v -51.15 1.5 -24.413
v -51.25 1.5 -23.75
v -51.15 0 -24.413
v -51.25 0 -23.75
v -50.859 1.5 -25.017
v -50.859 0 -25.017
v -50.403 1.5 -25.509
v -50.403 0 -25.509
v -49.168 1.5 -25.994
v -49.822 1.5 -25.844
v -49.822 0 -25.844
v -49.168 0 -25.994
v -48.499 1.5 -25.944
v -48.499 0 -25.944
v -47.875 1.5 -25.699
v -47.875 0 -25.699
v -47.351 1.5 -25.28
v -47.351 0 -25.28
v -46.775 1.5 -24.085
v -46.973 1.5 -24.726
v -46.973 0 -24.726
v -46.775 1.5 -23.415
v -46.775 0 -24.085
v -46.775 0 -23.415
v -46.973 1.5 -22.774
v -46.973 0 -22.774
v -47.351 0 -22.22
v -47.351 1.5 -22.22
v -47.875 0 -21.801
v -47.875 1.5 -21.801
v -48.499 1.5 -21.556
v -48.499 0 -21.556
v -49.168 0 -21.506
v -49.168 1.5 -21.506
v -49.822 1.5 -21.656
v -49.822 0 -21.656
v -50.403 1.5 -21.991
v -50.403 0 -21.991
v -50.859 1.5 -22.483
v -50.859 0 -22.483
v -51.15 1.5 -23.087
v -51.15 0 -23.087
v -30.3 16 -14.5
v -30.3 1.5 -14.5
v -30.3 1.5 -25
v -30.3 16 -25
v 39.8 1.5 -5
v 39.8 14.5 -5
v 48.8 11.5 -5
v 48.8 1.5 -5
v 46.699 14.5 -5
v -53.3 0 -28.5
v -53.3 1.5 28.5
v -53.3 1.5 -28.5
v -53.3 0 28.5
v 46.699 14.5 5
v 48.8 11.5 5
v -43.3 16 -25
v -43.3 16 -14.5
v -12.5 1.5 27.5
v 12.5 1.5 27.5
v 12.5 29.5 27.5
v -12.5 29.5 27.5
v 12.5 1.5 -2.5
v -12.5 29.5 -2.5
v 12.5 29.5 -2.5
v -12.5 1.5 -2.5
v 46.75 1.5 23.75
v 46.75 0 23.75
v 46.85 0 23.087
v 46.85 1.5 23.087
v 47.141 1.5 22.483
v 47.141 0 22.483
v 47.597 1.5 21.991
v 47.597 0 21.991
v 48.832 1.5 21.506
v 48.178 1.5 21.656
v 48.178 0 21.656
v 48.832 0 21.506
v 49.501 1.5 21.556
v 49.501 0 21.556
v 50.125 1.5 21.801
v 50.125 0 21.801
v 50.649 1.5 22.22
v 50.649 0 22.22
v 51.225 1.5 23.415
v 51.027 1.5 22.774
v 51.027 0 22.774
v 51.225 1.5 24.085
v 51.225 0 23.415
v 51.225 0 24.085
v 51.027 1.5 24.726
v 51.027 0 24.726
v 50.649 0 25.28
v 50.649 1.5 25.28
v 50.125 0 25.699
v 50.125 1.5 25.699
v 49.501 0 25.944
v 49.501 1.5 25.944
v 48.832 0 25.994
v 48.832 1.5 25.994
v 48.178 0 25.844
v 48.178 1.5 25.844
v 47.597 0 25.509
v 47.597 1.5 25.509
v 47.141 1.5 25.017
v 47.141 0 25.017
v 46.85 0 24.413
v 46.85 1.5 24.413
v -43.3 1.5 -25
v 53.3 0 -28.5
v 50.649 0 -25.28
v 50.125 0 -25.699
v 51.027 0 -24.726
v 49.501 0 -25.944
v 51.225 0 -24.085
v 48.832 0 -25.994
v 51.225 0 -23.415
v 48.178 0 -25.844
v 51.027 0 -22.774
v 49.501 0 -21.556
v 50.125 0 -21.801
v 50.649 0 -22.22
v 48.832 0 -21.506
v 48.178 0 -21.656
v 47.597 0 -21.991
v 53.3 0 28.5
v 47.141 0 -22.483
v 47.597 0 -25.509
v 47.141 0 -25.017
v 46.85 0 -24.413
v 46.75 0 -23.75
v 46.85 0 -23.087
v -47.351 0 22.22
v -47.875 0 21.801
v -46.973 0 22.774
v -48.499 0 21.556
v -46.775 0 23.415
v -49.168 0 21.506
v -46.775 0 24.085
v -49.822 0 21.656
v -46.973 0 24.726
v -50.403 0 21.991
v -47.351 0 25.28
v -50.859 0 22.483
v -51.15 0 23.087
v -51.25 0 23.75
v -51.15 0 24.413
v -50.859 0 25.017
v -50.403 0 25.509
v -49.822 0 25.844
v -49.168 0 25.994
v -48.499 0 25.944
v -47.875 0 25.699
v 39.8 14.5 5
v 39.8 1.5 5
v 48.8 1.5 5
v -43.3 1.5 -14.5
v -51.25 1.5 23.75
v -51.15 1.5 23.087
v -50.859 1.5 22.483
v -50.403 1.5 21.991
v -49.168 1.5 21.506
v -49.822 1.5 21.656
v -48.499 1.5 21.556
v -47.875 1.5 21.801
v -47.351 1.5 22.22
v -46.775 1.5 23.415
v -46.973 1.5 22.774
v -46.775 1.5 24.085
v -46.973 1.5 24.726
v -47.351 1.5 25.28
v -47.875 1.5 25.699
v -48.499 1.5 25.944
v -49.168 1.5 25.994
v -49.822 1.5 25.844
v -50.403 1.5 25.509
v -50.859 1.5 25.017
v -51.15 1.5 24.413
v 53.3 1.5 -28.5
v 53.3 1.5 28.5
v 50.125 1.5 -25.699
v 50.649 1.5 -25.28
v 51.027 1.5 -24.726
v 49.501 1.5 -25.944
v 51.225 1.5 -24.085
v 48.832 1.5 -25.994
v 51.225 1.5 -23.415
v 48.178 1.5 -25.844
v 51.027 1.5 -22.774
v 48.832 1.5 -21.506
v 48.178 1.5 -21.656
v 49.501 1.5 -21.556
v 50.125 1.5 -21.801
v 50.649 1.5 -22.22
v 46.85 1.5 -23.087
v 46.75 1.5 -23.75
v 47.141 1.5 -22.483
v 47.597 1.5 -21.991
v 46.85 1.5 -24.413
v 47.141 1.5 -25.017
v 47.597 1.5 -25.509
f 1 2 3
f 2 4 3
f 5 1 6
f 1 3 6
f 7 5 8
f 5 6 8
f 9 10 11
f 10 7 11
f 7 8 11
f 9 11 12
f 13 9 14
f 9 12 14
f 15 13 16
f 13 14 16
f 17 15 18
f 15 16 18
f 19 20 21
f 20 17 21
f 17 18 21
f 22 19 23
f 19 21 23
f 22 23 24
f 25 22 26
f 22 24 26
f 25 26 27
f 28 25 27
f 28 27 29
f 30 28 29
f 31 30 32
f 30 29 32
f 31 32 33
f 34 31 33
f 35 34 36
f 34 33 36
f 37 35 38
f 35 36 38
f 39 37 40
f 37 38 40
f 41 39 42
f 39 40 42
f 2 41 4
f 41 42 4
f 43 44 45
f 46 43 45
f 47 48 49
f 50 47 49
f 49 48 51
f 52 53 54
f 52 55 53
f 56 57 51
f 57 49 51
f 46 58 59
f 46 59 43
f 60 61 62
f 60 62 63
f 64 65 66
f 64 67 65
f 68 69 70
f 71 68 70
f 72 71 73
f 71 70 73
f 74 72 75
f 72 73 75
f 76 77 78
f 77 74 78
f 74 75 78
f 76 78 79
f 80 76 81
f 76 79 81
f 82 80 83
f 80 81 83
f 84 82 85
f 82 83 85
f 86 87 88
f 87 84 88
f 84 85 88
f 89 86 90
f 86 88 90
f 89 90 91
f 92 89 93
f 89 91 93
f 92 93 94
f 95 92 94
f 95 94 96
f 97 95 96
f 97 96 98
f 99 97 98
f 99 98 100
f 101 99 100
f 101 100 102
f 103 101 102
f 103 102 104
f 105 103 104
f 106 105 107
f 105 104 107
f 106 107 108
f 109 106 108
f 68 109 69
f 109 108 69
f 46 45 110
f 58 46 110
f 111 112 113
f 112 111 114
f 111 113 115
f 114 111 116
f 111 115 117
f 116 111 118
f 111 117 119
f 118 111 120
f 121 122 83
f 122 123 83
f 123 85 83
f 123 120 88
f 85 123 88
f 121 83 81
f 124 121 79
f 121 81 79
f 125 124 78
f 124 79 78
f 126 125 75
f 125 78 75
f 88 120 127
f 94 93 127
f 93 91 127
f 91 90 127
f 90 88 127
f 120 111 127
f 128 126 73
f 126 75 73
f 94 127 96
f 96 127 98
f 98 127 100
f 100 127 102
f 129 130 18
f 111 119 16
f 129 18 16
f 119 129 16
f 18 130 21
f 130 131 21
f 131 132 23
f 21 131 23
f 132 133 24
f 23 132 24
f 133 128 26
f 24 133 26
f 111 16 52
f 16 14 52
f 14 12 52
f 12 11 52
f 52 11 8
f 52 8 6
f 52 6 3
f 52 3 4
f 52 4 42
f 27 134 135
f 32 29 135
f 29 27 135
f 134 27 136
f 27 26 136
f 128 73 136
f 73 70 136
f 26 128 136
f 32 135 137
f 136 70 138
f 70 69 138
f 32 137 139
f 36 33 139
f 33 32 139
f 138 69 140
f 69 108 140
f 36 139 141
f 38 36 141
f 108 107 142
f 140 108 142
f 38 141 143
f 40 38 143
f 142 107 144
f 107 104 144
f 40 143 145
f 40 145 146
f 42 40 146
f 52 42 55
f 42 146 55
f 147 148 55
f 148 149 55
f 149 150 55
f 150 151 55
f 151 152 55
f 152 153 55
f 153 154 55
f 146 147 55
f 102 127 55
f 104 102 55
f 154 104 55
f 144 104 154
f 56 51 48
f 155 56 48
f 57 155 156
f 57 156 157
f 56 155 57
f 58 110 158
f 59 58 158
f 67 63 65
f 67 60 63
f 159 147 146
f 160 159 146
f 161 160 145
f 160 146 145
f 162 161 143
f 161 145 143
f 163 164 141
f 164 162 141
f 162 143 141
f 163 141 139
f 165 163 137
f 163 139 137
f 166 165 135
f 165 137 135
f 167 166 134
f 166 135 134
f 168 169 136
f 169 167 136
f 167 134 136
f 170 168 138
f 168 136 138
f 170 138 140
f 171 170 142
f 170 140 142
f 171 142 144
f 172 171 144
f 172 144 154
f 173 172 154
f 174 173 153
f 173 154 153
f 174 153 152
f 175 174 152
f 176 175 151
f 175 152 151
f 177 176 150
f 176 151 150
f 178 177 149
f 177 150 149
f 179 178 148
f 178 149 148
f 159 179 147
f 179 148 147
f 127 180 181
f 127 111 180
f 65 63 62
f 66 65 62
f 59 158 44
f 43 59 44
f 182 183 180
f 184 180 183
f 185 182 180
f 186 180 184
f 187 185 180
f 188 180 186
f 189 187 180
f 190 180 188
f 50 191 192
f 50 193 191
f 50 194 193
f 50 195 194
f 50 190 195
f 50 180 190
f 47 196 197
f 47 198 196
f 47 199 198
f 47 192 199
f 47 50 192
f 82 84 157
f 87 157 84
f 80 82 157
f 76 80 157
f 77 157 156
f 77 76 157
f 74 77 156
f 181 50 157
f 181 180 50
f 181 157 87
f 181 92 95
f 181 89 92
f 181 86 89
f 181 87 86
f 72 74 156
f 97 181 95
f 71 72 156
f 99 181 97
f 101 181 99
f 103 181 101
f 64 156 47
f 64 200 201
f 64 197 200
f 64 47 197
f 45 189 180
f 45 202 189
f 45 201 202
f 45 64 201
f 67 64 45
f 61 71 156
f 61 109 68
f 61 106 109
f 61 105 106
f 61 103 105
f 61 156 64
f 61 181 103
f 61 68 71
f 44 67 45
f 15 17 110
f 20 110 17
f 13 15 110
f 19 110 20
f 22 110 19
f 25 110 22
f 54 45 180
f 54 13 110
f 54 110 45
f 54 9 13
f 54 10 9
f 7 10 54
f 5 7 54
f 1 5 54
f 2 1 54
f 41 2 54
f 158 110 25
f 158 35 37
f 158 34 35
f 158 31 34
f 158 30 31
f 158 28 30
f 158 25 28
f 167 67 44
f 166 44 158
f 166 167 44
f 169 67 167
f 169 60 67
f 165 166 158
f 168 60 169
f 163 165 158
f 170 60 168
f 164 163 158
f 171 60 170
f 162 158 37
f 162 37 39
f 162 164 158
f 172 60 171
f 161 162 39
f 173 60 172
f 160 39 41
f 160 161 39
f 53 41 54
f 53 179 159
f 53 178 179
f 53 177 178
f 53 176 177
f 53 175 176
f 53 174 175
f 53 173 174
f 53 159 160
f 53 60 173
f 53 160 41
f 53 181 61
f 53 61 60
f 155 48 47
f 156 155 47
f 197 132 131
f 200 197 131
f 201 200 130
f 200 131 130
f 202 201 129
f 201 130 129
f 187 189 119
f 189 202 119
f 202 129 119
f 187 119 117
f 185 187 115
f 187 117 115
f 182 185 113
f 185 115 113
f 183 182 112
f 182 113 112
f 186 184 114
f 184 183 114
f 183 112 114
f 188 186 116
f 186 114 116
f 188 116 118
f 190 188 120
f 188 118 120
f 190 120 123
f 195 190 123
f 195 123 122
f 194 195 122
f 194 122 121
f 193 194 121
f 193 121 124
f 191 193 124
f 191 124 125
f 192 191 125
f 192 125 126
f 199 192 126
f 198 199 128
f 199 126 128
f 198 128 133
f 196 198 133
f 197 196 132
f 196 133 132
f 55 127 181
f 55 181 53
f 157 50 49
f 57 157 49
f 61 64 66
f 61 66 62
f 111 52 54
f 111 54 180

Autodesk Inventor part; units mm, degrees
ref_plane "YZ Plane" through (0, 0, 0) normal (1, 0, 0) x (0, 1, 0)
ref_plane "XZ Plane" through (0, 0, 0) normal (0, 1, 0) x (-1, 0, 0)
ref_plane "XY Plane" through (0, 0, 0) normal (0, 0, 1) x (1, 0, 0)
sketch "스케치1" plane through (0, 0, 0) normal (0, 1, 0) x (-1, 0, 0)
  line L0 (-53.3, 28.5) -> (53.3, 28.5)
  line L1 (53.3, 28.5) -> (53.3, -28.5)
  line L2 (53.3, -28.5) -> (-53.3, -28.5)
  line L3 (-53.3, -28.5) -> (-53.3, 28.5)
  line L4 (-53.3, 28.5) -> (53.3, -28.5) construction
  line L5 (53.3, 28.5) -> (-53.3, -28.5) construction
  circle A0 centre (49, 23.75) radius 2.25
  line L6 (0, 0) -> (18.7645, 0)
  line L7 (0, 0) -> (0, -10.3185)
  circle A1 centre (-49, 23.75) radius 2.25
  circle A2 centre (49, -23.75) radius 2.25
  circle A3 centre (-49, -23.75) radius 2.25
  dimension "d0" = 106.6
  dimension "d1" = 57
  dimension "d2" = 4.5
  dimension "d3" = 47.5
  dimension "d4" = 98
extrude "돌출1" add sketch "스케치1" along normal blind 1.5
sketch "스케치2" plane through (0, 1.5, 0) normal (0, 1, 0) x (1, 0, 0)
  line L0 (-43.3, 14.5) -> (-30.3, 14.5)
  line L1 (-30.3, 14.5) -> (-30.3, 25)
  line L2 (-30.3, 25) -> (-43.3, 25)
  line L3 (-43.3, 25) -> (-43.3, 14.5)
  line L4 (-43.3, 14.5) -> (-30.3, 25) construction
  line L5 (-30.3, 14.5) -> (-43.3, 25) construction
  line L6 (-53.3, 28.5) -> (-53.3, -28.5) projected
  line L7 (53.3, 28.5) -> (-53.3, 28.5) projected
  point P0 (0, 0)
  point P1 (-36.8, 19.75)
  dimension "d7" = 10.5
  dimension "d8" = 13
  dimension "d9" = 10
  dimension "d10" = 3.5
extrude "돌출2" add sketch "스케치2" along normal blind 14.5
sketch "스케치3" plane through (0, 1.5, 0) normal (0, 1, 0) x (1, 0, 0)
  line L0 (12.5, -27.5) -> (-12.5, -27.5)
  line L1 (-12.5, -27.5) -> (-12.5, 2.5)
  line L2 (-12.5, 2.5) -> (12.5, 2.5)
  line L3 (12.5, 2.5) -> (12.5, -27.5)
  line L4 (12.5, -27.5) -> (-12.5, 2.5) construction
  line L5 (-12.5, -27.5) -> (12.5, 2.5) construction
  line L6 (-53.3, -28.5) -> (53.3, -28.5) projected
  point P0 (0, 0)
  point P1 (0, -12.5)
  dimension "d13" = 25
  dimension "d14" = 30
  dimension "d15" = 16
extrude "돌출3" add sketch "스케치3" along normal blind 28
sketch "스케치4" plane through (0, 0, 0) normal (0, 0, 1) x (1, 0, 0)
  line L0 (-53.3, 1.5) -> (53.3, 1.5) projected
  line L1 (48.8, 1.5) -> (48.8, 11.5)
  line L2 (48.8, 11.5) -> (46.6994, 14.5)
  line L3 (46.6994, 14.5) -> (39.8, 14.5)
  line L4 (39.8, 14.5) -> (39.8, 1.5)
  point P0 (0, 0)
  dimension "d18" = 9
  dimension "d19" = 145
  dimension "d20" = 13
  dimension "d21" = 4.5
  dimension "d22" = 10
extrude "돌출4" add sketch "스케치4" along normal mid plane 10
properties part number "AC-DC컨버터"
